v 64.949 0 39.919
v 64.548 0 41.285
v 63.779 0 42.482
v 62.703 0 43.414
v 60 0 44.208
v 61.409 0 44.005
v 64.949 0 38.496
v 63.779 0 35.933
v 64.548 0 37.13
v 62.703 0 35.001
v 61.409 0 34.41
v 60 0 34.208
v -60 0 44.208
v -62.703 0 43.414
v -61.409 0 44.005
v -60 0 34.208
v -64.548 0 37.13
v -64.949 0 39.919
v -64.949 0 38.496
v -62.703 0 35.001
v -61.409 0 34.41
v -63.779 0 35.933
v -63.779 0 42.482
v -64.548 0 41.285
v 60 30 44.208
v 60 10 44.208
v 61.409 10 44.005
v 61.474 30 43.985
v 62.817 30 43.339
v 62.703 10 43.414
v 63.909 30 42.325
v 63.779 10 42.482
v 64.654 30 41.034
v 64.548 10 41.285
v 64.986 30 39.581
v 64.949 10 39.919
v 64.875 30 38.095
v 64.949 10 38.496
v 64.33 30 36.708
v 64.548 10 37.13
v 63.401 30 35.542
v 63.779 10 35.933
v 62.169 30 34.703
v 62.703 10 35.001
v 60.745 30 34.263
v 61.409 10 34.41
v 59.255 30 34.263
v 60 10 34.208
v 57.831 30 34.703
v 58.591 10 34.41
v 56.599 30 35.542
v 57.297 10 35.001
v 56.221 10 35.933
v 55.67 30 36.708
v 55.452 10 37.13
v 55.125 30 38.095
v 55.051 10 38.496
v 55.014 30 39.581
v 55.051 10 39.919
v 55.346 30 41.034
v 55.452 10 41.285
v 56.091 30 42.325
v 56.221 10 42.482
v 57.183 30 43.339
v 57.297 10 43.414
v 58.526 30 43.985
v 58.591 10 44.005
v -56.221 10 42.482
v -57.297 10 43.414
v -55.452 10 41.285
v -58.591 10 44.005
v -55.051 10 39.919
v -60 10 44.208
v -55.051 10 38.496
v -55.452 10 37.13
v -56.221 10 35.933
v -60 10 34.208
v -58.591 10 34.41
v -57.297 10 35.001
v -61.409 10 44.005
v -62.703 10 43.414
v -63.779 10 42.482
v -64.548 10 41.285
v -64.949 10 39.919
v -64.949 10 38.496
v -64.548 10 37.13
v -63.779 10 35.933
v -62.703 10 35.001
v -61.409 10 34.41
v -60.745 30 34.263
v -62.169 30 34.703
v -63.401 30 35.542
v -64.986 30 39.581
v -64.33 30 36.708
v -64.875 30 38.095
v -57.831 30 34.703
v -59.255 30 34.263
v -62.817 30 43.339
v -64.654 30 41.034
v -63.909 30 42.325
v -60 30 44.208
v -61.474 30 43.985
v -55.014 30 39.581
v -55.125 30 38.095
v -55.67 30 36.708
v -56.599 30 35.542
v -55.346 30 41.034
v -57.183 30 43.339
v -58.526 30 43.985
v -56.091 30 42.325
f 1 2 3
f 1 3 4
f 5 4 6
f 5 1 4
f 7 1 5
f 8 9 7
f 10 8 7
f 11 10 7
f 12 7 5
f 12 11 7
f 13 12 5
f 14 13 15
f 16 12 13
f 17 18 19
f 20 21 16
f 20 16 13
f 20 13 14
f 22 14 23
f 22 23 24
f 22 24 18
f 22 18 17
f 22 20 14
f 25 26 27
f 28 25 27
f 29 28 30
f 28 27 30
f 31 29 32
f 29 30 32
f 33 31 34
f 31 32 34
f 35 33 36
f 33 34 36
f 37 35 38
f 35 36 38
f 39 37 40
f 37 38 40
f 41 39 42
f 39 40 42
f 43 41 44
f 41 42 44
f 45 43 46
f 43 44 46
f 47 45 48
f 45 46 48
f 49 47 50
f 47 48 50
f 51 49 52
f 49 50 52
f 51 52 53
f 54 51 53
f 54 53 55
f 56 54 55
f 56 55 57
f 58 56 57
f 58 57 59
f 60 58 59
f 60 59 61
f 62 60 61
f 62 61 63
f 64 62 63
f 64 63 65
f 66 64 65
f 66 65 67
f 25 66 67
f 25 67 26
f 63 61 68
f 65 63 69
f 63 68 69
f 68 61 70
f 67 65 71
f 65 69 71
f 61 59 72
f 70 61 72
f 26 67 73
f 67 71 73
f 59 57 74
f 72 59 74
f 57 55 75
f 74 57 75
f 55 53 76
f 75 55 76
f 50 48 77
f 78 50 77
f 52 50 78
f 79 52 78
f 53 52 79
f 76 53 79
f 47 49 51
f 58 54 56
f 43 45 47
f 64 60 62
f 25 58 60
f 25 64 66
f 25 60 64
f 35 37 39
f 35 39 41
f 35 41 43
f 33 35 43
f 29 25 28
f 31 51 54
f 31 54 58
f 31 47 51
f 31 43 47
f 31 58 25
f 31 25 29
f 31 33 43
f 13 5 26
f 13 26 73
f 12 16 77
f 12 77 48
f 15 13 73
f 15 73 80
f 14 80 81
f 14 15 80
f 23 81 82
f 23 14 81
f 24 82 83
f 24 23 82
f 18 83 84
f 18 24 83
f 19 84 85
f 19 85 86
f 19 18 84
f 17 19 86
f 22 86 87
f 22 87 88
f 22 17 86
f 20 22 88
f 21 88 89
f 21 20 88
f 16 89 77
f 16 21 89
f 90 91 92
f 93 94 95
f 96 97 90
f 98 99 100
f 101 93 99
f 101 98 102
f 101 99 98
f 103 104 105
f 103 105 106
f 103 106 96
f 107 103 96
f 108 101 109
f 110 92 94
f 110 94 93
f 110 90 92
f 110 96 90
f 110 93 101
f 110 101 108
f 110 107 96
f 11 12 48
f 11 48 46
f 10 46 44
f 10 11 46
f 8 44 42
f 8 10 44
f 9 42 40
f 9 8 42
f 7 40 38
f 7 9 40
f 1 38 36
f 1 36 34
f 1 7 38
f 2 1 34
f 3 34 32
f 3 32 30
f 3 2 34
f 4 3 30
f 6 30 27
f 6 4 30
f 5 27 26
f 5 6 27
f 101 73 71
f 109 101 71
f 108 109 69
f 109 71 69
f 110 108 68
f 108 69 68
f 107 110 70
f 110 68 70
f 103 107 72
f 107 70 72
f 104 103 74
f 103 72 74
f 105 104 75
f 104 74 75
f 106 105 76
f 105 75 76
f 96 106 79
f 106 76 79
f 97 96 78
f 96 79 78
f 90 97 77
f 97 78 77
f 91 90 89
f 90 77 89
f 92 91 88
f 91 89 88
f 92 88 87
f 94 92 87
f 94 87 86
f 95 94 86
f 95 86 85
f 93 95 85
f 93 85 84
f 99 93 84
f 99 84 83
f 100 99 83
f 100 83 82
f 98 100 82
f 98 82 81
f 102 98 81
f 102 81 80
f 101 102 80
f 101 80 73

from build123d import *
from build123d.topology import SkipClean

# Parameters (mm, degrees)
SALIENTE_EXTRUIR1_DEPTH = 10
CROQUIS2_R              = 5
SALIENTE_EXTRUIR2_DEPTH = 20


with BuildPart() as part:
    # Croquis1 → Saliente-Extruir1 (new body)
    with BuildSketch(Plane(origin=(0, 0, 0), x_dir=(1, 0, 0), z_dir=(0, 1, 0))):
        with BuildLine():
            Line((-60, -34.207532581), (60, -34.207532581))
            ThreePointArc((60, -34.207532581), (65, -39.207532581), (60, -44.207532581))
            Line((60, -44.207532581), (-60, -44.207532581))
            ThreePointArc((-60, -44.207532581), (-65, -39.207532581), (-60, -34.207532581))
        make_face()
    extrude(amount=SALIENTE_EXTRUIR1_DEPTH)

    # Croquis2 → Saliente-Extruir2 (add)
    with SkipClean():  # the faces are left unmerged after this step: merging them gives an invalid solid
        with BuildSketch(Plane(origin=(0, 10, 0), x_dir=(1, 0, 0), z_dir=(0, 1, 0))):
            with Locations((60, -39.207532581)):
                Circle(CROQUIS2_R)
            with Locations((-60, -39.207532581)):
                Circle(CROQUIS2_R)
        extrude(amount=SALIENTE_EXTRUIR2_DEPTH)


solid = part.part
